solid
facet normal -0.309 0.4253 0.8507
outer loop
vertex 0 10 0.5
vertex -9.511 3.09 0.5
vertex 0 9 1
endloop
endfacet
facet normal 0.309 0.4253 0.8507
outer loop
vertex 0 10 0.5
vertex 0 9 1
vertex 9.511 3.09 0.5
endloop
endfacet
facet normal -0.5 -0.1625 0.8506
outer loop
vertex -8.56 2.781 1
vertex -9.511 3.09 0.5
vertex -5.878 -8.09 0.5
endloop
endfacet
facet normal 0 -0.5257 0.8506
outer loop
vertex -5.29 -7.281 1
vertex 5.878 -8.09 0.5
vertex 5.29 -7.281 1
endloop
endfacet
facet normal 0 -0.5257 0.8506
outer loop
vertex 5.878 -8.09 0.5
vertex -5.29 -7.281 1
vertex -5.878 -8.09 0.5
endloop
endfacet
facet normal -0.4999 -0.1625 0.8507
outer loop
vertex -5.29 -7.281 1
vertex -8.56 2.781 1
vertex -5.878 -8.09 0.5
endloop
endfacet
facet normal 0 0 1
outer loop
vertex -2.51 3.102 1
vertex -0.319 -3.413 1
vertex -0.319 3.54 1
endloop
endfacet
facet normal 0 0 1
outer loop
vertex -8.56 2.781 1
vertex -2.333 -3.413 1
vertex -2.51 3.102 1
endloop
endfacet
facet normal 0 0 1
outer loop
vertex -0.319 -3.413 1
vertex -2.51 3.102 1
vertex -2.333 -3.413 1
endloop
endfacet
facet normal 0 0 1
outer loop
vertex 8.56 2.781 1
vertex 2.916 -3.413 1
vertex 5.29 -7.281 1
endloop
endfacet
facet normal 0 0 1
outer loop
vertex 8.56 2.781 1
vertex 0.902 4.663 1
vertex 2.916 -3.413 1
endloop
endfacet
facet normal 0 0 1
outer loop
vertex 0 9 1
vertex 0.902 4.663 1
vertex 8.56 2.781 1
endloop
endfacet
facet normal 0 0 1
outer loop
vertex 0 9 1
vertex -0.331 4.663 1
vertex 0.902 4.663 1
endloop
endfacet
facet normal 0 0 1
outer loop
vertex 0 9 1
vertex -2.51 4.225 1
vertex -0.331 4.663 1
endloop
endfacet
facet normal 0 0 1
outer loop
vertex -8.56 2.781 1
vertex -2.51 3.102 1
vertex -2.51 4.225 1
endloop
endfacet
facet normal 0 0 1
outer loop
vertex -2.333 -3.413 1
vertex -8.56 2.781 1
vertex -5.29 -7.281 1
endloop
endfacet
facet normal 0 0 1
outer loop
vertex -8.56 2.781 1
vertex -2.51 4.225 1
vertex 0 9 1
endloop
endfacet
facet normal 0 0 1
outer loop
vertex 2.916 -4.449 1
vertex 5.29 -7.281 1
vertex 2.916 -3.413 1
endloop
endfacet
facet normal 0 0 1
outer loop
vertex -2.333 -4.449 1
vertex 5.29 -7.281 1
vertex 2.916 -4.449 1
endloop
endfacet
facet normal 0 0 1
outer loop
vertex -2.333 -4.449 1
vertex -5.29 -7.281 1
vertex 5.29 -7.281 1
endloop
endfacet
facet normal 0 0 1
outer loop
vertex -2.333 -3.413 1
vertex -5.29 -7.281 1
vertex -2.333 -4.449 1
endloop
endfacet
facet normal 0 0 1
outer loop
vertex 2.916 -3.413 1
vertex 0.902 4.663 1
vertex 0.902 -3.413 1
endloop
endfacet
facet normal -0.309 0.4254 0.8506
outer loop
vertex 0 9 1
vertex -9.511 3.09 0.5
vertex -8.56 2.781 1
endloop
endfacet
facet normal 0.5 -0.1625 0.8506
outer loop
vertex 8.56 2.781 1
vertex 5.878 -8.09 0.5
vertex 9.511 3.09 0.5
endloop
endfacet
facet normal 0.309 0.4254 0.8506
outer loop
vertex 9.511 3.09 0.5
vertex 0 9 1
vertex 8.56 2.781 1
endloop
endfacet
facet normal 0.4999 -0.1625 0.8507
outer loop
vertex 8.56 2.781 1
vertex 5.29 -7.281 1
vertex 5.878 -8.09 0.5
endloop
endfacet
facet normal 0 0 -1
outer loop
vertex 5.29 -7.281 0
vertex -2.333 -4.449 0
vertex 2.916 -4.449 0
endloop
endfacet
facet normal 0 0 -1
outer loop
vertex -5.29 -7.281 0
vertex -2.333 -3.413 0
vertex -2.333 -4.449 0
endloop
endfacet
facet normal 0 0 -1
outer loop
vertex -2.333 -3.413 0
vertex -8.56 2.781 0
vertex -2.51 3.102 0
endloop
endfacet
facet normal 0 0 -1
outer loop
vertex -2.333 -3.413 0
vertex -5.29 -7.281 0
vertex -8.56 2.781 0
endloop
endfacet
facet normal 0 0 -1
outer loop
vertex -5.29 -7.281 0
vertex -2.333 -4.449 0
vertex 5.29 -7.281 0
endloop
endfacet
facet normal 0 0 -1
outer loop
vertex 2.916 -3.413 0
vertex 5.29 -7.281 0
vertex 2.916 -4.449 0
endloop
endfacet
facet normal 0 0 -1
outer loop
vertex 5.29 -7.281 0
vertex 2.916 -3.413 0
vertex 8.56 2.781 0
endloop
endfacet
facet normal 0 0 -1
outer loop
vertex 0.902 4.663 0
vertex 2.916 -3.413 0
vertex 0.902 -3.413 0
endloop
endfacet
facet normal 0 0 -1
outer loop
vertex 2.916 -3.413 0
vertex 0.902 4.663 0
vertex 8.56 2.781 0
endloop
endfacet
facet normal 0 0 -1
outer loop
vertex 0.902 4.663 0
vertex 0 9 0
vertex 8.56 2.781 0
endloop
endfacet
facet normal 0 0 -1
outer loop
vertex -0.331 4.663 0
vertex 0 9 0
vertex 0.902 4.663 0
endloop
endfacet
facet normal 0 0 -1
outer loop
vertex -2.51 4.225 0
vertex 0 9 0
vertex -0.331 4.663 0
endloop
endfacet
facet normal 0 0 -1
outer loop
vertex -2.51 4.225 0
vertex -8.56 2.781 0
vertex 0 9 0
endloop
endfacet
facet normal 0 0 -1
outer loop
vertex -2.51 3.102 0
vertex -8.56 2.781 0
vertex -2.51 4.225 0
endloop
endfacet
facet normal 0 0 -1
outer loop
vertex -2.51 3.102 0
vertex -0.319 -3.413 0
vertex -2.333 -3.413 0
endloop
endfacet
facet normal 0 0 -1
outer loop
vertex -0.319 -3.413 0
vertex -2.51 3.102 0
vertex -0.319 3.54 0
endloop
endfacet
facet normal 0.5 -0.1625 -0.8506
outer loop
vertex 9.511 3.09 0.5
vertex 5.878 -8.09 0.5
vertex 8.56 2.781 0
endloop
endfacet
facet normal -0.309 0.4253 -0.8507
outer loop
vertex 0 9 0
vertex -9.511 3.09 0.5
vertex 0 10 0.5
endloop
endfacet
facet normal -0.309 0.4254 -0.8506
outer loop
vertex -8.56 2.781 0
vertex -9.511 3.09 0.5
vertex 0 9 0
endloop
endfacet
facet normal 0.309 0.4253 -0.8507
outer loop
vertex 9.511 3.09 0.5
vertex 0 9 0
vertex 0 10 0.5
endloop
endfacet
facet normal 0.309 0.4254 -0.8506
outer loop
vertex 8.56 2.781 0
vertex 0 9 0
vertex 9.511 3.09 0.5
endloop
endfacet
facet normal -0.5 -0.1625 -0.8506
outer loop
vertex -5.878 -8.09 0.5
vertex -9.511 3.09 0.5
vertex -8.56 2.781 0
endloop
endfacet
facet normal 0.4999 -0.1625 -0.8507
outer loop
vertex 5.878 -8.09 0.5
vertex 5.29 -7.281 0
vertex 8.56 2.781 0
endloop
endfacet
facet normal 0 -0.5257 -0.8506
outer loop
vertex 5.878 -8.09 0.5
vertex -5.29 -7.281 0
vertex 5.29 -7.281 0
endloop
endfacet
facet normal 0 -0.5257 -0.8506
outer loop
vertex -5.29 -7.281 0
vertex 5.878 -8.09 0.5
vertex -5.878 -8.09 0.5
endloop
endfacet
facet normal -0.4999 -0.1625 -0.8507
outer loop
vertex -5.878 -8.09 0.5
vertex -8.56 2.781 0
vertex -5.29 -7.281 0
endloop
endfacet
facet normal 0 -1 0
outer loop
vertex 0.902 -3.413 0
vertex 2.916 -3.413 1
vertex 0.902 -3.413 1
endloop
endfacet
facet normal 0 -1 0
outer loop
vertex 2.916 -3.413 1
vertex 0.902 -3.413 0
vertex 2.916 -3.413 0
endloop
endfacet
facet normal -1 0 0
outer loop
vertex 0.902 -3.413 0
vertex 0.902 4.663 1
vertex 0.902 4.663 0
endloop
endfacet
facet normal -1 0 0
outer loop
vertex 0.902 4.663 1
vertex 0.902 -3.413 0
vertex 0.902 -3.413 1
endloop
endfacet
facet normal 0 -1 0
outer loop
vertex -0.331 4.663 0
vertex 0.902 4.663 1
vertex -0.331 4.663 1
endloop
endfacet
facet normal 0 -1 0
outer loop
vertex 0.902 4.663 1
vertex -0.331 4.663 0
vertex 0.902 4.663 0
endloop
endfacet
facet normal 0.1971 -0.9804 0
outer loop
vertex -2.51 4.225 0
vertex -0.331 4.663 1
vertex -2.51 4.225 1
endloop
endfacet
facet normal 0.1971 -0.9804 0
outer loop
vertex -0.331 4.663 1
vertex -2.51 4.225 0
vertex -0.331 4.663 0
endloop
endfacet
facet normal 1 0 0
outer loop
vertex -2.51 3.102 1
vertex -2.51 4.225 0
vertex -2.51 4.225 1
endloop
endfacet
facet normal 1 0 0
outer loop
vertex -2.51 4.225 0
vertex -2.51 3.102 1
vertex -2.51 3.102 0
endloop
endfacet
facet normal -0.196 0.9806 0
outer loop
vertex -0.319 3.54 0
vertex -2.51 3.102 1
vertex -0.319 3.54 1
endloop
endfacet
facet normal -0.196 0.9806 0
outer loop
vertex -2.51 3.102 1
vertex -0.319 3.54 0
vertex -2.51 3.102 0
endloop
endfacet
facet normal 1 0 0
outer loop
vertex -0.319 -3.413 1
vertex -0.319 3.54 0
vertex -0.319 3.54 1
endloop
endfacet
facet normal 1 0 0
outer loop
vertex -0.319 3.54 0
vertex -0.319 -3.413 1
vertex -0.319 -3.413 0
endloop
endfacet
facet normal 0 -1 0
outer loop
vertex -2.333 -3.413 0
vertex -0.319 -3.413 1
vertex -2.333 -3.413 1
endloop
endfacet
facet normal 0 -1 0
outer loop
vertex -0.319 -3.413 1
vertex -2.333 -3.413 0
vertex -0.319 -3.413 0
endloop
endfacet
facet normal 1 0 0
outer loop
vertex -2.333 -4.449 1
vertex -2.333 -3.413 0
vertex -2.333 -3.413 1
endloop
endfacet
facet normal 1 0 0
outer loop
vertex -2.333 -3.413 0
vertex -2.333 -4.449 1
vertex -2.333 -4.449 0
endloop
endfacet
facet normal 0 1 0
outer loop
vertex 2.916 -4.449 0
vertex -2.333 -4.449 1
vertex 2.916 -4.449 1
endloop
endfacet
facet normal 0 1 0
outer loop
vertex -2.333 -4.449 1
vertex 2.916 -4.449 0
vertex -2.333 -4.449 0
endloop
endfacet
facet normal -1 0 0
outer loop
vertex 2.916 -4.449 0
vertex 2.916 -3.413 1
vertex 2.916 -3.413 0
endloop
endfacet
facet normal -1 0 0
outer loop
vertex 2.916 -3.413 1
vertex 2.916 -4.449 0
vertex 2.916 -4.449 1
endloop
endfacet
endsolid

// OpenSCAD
// Created by Grant Emsley <grant@emsley.ca>

/* [Shape] */
// total diameter of the coin
outerDiameter = 20; // [1:50]
// diameter at the top of the bevel
innerDiameter = 18; // [1:50]
// bevel only top or both sides?
bevelBothSides = "yes"; // [yes,no]
// adjust to line up text the way you want
shapeRotation = 90; // [0:360]
// number of points the coin shape has
points = 5; // [3:20]
// total height of the coin
totalHeight = 1; // [0.5:0.1:20]

/* [Text] */

// Text to cut out of the coin
coinValue = "1";
textSize = 9;
textFont = "Open Sans";


module taperedShape() {
	if(bevelBothSides == "yes") {
		rotate(shapeRotation) translate([0,0,totalHeight/2]) cylinder(h = totalHeight/2, d1 = outerDiameter, d2 = innerDiameter, $fn = points);
		rotate(shapeRotation) cylinder(h = totalHeight/2, d1 = innerDiameter, d2 = outerDiameter, $fn = points);
	} else {
		cylinder(h = totalHeight, d1 = outerDiameter, d2 = innerDiameter, $fn = points);
	}
}

module createText() {
	translate([0,0,-1]) linear_extrude(height = totalHeight + 2) text(str(coinValue), size=textSize, halign="center", valign="center", font=textFont);
}


difference() {
	taperedShape();
	createText();
}
